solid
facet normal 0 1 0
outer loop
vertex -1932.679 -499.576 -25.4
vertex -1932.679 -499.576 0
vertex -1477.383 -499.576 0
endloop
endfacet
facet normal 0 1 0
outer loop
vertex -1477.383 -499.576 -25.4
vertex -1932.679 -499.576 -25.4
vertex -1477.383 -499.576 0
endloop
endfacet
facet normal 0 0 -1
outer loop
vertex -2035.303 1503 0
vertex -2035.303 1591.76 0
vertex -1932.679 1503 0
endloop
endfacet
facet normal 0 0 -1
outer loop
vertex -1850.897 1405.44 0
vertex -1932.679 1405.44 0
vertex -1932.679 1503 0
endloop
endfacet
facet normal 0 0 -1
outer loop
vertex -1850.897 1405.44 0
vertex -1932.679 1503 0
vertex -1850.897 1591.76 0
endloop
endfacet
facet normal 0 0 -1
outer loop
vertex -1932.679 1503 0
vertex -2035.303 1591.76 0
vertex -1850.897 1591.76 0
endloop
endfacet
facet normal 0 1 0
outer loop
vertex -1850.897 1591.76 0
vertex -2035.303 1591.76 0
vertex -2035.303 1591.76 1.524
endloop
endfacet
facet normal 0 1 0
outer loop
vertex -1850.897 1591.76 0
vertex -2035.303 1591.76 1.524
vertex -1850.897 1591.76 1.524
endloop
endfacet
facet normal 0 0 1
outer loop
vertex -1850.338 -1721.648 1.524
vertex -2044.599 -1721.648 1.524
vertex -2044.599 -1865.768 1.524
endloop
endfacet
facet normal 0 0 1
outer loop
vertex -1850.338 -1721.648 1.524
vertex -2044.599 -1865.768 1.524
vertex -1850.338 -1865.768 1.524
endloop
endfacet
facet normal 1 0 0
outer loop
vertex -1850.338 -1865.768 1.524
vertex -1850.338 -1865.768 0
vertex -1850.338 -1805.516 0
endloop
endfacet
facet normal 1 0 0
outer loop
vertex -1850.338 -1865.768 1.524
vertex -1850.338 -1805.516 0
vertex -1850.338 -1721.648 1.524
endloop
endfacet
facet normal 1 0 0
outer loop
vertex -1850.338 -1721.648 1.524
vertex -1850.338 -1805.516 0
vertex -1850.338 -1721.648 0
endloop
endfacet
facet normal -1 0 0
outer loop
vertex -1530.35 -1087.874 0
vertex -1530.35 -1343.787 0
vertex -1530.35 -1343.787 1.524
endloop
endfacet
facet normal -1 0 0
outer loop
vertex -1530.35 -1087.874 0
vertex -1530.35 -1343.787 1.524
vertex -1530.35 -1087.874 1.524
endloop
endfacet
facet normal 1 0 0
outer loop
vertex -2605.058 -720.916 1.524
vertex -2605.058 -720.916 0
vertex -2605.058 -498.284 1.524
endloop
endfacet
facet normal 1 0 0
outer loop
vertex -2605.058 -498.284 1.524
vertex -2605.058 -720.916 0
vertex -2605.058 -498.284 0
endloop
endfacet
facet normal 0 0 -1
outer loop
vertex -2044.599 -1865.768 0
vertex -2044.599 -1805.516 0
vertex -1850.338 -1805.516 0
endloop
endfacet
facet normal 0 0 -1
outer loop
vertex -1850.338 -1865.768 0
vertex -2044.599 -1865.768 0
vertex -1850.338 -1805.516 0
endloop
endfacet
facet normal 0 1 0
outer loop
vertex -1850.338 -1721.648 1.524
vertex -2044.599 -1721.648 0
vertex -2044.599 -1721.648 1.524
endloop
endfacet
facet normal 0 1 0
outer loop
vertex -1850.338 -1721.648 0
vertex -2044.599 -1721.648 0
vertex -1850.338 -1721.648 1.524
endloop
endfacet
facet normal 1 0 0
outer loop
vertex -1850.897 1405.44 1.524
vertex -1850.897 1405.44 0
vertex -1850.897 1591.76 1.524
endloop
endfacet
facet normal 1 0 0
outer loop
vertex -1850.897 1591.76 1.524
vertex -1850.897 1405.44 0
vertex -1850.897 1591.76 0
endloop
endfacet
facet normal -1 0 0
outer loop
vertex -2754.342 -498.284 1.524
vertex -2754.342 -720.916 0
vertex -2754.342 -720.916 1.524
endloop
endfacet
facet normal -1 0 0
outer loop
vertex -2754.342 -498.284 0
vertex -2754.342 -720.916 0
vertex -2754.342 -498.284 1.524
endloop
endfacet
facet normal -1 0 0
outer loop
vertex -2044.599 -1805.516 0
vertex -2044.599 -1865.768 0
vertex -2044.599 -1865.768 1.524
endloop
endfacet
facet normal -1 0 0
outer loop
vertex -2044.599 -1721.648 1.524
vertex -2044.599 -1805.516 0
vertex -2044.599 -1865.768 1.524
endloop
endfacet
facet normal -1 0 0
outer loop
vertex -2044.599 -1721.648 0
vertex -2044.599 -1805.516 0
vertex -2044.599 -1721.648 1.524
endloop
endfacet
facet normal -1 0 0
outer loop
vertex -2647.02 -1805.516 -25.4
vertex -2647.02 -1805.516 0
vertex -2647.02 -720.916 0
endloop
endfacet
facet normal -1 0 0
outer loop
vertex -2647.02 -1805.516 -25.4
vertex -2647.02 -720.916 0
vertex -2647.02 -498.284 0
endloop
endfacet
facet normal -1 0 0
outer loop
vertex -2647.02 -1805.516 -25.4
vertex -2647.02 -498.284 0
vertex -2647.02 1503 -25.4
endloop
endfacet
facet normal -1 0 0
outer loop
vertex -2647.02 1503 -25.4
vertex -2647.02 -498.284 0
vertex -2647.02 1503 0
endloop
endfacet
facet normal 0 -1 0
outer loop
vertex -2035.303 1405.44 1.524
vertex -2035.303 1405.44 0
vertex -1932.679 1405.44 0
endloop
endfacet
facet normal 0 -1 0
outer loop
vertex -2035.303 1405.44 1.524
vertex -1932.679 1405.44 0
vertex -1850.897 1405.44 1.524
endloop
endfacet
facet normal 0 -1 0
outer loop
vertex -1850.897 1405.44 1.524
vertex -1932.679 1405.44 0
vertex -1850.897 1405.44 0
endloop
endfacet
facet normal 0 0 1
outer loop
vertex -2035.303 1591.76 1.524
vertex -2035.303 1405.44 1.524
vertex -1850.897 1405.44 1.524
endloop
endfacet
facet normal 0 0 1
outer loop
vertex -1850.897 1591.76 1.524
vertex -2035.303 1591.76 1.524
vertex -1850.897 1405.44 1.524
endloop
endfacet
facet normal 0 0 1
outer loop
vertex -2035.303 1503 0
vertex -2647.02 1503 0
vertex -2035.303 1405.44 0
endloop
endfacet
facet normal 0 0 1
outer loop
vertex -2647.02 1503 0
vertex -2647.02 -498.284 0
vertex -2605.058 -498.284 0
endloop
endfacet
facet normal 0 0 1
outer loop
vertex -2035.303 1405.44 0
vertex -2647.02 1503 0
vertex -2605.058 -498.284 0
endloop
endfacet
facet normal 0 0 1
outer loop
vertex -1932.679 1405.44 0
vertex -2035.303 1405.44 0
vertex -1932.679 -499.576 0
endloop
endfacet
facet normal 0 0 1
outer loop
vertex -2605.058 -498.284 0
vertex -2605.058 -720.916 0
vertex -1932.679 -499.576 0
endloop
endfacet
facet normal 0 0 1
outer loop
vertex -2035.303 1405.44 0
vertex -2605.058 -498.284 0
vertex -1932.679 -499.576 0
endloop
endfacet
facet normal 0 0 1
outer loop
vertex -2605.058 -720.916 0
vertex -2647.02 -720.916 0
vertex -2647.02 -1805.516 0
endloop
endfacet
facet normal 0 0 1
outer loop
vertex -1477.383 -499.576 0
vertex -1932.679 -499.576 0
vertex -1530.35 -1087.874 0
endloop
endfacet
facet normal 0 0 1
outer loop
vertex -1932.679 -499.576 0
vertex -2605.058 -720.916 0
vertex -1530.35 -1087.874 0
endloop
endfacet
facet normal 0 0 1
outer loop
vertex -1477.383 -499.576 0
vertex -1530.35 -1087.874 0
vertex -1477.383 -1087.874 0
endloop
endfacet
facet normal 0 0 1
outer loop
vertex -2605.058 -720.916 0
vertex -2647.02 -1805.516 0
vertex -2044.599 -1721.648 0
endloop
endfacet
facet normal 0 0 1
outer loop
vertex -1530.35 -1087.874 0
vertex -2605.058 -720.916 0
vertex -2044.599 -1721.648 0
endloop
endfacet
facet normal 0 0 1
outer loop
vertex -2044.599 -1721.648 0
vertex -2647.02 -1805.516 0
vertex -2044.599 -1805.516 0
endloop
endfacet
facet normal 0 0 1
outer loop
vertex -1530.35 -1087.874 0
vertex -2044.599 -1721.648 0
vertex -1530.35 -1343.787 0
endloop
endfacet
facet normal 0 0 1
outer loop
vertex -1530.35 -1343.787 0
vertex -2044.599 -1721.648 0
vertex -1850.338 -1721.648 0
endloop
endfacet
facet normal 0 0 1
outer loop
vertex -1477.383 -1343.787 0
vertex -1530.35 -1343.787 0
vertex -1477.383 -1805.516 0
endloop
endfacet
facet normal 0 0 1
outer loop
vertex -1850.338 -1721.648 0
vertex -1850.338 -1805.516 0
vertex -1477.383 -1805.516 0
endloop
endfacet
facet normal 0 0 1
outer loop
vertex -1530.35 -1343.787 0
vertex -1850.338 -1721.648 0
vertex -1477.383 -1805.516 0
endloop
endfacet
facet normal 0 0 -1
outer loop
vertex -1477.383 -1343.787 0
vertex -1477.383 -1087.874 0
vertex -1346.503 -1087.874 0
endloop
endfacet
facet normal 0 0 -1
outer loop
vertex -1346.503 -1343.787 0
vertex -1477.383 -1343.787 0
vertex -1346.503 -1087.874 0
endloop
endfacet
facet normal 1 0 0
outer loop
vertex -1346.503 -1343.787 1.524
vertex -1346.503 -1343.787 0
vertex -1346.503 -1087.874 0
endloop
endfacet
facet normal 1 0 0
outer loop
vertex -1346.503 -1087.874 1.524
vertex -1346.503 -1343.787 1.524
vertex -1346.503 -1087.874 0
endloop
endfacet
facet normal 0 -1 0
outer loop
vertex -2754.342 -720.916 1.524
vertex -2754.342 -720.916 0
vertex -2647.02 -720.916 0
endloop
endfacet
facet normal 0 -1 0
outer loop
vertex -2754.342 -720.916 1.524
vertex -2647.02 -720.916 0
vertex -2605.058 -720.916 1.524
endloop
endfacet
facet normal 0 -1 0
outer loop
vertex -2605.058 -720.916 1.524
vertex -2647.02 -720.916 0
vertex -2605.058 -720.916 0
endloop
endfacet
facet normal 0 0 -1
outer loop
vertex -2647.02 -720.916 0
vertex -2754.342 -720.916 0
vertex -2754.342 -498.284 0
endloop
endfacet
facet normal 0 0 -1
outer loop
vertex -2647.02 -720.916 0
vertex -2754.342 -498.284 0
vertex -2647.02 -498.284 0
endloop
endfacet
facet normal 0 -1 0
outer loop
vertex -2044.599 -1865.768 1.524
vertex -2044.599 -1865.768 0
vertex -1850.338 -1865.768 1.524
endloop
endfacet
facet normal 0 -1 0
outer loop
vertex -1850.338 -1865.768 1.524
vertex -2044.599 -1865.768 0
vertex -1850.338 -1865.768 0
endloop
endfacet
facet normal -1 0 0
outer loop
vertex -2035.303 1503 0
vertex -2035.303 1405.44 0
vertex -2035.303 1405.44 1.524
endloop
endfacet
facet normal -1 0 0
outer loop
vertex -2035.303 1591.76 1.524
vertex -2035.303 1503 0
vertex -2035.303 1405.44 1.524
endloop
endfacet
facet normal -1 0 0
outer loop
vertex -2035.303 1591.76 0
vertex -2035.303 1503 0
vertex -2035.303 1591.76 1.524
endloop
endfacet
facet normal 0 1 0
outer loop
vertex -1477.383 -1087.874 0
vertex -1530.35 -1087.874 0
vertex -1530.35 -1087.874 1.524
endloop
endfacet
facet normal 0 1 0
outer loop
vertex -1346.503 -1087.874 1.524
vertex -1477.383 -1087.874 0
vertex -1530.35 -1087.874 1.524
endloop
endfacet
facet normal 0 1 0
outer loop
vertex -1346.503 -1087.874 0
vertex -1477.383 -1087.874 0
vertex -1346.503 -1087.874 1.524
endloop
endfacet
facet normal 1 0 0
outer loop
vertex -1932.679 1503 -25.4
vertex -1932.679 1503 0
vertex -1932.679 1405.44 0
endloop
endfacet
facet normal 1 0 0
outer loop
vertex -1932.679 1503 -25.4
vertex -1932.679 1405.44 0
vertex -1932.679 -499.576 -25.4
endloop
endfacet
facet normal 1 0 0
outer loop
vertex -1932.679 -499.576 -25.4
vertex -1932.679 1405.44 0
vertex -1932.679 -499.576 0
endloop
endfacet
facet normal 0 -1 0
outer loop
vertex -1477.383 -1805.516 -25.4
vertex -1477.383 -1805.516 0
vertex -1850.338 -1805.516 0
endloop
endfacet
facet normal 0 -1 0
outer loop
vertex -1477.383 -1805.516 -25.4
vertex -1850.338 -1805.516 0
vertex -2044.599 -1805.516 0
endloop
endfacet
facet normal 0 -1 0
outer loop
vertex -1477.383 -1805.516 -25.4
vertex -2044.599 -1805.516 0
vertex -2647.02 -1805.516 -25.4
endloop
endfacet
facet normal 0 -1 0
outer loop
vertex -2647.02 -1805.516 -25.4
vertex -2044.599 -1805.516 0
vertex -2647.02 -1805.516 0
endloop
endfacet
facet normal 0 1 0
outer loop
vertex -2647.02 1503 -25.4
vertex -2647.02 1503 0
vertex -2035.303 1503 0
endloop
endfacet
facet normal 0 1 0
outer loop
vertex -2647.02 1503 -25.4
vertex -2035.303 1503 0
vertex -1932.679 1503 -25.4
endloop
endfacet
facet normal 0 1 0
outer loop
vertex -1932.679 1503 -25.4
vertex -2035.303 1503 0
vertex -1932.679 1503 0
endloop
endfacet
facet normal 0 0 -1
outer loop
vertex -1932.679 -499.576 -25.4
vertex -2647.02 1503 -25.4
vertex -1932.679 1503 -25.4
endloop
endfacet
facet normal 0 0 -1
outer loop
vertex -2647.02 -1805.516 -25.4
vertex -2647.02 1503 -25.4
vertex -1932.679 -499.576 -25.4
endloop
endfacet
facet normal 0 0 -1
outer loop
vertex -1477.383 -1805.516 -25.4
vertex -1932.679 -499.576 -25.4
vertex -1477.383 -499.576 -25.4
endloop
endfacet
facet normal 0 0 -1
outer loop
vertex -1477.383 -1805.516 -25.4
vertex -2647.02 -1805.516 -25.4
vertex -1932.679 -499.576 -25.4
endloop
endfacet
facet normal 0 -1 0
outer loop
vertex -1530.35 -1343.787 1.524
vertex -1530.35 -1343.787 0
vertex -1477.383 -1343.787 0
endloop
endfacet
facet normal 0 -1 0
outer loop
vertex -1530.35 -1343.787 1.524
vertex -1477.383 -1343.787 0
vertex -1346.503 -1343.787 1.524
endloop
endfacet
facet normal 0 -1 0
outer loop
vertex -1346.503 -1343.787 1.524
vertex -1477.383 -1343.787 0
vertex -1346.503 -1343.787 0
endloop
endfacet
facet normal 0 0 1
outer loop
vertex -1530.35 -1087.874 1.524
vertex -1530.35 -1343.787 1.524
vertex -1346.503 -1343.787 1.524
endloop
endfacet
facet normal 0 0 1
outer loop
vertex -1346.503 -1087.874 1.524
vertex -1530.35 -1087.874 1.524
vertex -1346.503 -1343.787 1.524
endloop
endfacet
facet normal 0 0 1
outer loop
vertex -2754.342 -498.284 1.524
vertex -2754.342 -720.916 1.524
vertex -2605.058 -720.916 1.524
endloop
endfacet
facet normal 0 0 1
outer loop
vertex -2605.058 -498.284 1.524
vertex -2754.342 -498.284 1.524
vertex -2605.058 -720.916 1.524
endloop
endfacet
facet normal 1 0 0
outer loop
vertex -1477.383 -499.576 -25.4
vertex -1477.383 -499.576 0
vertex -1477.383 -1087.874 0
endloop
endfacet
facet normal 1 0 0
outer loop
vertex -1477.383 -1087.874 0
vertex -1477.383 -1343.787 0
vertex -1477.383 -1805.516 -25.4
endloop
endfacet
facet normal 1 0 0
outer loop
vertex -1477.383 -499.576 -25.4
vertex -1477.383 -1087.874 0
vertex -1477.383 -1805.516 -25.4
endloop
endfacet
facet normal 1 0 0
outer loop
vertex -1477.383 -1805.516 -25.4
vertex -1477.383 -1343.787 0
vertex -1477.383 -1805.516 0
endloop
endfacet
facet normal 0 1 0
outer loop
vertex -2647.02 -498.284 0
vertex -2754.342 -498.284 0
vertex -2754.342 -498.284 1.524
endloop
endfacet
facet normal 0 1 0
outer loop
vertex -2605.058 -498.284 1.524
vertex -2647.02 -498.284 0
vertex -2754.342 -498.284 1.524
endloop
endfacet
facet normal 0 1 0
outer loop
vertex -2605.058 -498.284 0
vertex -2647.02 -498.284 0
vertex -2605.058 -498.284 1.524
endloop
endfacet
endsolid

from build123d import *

# Parameters (mm, degrees)
F1_W     = 194.2608356476
F1_H     = 144.1197395325
F2_DEPTH = 1.524
F1_W_2   = 184.4062316895
F1_H_2   = 186.3207695007
F3_W     = 149.2831367493
F3_H     = 222.6326616287
F4_DEPTH = 1.524
F5_W     = 183.84650383
F5_H     = 255.9131835098
F6_DEPTH = 1.524
F7_W     = 455.2961587906
F7_H     = 1305.9402406216
F8_DEPTH = 25.4


with BuildPart() as f2:
    # F1 (on Top) → F2 (new body)
    with BuildSketch(Plane.XY):
        with Locations((-1947.4688768387, -1793.7077283859)):
            Rectangle(F1_W, F1_H)
    extrude(amount=F2_DEPTH)



with BuildPart() as f2b:
    # F1 (on Top) → F2, piece 2 (new body)
    with BuildSketch(Plane.XY):
        with Locations((-1943.1, 1498.6)):
            Rectangle(F1_W_2, F1_H_2)
    extrude(amount=F2_DEPTH)


with BuildPart() as f4:
    # F3 (on Top) → F4 (new body)
    with BuildSketch(Plane.XY):
        with Locations((-2679.7, -609.6)):
            Rectangle(F3_W, F3_H)
    extrude(amount=F4_DEPTH)


with BuildPart() as f6:
    # F5 (on Top) → F6 (new body)
    with BuildSketch(Plane.XY):
        with Locations((-1438.426748085, -1215.8304082451)):
            Rectangle(F5_W, F5_H)
    extrude(amount=F6_DEPTH)


with BuildPart() as f2_1:
    add(f2.part)

    add(f2b.part)  # F8 merges F2b

    add(f4.part)  # F8 merges F4

    add(f6.part)  # F8 merges F6
    # F7 (on face) → F8 (join)
    with BuildSketch(Plane(origin=(0, 0, 0), x_dir=(1, 0, 0), z_dir=(0, 0, -1))):
        Polygon((-2647.0203399658, -1503.0001401901), (-1932.6788187027, -1503.0001401901), (-1932.6788187027, 499.576240778), (-1932.6788187027, 1805.5164813995), (-2647.0203399658, 1805.5164813995), align=None)
        with Locations((-1705.0307393074, 1152.5463610888)):
            Rectangle(F7_W, F7_H)
    extrude(amount=F8_DEPTH)


solid = f2_1.part
